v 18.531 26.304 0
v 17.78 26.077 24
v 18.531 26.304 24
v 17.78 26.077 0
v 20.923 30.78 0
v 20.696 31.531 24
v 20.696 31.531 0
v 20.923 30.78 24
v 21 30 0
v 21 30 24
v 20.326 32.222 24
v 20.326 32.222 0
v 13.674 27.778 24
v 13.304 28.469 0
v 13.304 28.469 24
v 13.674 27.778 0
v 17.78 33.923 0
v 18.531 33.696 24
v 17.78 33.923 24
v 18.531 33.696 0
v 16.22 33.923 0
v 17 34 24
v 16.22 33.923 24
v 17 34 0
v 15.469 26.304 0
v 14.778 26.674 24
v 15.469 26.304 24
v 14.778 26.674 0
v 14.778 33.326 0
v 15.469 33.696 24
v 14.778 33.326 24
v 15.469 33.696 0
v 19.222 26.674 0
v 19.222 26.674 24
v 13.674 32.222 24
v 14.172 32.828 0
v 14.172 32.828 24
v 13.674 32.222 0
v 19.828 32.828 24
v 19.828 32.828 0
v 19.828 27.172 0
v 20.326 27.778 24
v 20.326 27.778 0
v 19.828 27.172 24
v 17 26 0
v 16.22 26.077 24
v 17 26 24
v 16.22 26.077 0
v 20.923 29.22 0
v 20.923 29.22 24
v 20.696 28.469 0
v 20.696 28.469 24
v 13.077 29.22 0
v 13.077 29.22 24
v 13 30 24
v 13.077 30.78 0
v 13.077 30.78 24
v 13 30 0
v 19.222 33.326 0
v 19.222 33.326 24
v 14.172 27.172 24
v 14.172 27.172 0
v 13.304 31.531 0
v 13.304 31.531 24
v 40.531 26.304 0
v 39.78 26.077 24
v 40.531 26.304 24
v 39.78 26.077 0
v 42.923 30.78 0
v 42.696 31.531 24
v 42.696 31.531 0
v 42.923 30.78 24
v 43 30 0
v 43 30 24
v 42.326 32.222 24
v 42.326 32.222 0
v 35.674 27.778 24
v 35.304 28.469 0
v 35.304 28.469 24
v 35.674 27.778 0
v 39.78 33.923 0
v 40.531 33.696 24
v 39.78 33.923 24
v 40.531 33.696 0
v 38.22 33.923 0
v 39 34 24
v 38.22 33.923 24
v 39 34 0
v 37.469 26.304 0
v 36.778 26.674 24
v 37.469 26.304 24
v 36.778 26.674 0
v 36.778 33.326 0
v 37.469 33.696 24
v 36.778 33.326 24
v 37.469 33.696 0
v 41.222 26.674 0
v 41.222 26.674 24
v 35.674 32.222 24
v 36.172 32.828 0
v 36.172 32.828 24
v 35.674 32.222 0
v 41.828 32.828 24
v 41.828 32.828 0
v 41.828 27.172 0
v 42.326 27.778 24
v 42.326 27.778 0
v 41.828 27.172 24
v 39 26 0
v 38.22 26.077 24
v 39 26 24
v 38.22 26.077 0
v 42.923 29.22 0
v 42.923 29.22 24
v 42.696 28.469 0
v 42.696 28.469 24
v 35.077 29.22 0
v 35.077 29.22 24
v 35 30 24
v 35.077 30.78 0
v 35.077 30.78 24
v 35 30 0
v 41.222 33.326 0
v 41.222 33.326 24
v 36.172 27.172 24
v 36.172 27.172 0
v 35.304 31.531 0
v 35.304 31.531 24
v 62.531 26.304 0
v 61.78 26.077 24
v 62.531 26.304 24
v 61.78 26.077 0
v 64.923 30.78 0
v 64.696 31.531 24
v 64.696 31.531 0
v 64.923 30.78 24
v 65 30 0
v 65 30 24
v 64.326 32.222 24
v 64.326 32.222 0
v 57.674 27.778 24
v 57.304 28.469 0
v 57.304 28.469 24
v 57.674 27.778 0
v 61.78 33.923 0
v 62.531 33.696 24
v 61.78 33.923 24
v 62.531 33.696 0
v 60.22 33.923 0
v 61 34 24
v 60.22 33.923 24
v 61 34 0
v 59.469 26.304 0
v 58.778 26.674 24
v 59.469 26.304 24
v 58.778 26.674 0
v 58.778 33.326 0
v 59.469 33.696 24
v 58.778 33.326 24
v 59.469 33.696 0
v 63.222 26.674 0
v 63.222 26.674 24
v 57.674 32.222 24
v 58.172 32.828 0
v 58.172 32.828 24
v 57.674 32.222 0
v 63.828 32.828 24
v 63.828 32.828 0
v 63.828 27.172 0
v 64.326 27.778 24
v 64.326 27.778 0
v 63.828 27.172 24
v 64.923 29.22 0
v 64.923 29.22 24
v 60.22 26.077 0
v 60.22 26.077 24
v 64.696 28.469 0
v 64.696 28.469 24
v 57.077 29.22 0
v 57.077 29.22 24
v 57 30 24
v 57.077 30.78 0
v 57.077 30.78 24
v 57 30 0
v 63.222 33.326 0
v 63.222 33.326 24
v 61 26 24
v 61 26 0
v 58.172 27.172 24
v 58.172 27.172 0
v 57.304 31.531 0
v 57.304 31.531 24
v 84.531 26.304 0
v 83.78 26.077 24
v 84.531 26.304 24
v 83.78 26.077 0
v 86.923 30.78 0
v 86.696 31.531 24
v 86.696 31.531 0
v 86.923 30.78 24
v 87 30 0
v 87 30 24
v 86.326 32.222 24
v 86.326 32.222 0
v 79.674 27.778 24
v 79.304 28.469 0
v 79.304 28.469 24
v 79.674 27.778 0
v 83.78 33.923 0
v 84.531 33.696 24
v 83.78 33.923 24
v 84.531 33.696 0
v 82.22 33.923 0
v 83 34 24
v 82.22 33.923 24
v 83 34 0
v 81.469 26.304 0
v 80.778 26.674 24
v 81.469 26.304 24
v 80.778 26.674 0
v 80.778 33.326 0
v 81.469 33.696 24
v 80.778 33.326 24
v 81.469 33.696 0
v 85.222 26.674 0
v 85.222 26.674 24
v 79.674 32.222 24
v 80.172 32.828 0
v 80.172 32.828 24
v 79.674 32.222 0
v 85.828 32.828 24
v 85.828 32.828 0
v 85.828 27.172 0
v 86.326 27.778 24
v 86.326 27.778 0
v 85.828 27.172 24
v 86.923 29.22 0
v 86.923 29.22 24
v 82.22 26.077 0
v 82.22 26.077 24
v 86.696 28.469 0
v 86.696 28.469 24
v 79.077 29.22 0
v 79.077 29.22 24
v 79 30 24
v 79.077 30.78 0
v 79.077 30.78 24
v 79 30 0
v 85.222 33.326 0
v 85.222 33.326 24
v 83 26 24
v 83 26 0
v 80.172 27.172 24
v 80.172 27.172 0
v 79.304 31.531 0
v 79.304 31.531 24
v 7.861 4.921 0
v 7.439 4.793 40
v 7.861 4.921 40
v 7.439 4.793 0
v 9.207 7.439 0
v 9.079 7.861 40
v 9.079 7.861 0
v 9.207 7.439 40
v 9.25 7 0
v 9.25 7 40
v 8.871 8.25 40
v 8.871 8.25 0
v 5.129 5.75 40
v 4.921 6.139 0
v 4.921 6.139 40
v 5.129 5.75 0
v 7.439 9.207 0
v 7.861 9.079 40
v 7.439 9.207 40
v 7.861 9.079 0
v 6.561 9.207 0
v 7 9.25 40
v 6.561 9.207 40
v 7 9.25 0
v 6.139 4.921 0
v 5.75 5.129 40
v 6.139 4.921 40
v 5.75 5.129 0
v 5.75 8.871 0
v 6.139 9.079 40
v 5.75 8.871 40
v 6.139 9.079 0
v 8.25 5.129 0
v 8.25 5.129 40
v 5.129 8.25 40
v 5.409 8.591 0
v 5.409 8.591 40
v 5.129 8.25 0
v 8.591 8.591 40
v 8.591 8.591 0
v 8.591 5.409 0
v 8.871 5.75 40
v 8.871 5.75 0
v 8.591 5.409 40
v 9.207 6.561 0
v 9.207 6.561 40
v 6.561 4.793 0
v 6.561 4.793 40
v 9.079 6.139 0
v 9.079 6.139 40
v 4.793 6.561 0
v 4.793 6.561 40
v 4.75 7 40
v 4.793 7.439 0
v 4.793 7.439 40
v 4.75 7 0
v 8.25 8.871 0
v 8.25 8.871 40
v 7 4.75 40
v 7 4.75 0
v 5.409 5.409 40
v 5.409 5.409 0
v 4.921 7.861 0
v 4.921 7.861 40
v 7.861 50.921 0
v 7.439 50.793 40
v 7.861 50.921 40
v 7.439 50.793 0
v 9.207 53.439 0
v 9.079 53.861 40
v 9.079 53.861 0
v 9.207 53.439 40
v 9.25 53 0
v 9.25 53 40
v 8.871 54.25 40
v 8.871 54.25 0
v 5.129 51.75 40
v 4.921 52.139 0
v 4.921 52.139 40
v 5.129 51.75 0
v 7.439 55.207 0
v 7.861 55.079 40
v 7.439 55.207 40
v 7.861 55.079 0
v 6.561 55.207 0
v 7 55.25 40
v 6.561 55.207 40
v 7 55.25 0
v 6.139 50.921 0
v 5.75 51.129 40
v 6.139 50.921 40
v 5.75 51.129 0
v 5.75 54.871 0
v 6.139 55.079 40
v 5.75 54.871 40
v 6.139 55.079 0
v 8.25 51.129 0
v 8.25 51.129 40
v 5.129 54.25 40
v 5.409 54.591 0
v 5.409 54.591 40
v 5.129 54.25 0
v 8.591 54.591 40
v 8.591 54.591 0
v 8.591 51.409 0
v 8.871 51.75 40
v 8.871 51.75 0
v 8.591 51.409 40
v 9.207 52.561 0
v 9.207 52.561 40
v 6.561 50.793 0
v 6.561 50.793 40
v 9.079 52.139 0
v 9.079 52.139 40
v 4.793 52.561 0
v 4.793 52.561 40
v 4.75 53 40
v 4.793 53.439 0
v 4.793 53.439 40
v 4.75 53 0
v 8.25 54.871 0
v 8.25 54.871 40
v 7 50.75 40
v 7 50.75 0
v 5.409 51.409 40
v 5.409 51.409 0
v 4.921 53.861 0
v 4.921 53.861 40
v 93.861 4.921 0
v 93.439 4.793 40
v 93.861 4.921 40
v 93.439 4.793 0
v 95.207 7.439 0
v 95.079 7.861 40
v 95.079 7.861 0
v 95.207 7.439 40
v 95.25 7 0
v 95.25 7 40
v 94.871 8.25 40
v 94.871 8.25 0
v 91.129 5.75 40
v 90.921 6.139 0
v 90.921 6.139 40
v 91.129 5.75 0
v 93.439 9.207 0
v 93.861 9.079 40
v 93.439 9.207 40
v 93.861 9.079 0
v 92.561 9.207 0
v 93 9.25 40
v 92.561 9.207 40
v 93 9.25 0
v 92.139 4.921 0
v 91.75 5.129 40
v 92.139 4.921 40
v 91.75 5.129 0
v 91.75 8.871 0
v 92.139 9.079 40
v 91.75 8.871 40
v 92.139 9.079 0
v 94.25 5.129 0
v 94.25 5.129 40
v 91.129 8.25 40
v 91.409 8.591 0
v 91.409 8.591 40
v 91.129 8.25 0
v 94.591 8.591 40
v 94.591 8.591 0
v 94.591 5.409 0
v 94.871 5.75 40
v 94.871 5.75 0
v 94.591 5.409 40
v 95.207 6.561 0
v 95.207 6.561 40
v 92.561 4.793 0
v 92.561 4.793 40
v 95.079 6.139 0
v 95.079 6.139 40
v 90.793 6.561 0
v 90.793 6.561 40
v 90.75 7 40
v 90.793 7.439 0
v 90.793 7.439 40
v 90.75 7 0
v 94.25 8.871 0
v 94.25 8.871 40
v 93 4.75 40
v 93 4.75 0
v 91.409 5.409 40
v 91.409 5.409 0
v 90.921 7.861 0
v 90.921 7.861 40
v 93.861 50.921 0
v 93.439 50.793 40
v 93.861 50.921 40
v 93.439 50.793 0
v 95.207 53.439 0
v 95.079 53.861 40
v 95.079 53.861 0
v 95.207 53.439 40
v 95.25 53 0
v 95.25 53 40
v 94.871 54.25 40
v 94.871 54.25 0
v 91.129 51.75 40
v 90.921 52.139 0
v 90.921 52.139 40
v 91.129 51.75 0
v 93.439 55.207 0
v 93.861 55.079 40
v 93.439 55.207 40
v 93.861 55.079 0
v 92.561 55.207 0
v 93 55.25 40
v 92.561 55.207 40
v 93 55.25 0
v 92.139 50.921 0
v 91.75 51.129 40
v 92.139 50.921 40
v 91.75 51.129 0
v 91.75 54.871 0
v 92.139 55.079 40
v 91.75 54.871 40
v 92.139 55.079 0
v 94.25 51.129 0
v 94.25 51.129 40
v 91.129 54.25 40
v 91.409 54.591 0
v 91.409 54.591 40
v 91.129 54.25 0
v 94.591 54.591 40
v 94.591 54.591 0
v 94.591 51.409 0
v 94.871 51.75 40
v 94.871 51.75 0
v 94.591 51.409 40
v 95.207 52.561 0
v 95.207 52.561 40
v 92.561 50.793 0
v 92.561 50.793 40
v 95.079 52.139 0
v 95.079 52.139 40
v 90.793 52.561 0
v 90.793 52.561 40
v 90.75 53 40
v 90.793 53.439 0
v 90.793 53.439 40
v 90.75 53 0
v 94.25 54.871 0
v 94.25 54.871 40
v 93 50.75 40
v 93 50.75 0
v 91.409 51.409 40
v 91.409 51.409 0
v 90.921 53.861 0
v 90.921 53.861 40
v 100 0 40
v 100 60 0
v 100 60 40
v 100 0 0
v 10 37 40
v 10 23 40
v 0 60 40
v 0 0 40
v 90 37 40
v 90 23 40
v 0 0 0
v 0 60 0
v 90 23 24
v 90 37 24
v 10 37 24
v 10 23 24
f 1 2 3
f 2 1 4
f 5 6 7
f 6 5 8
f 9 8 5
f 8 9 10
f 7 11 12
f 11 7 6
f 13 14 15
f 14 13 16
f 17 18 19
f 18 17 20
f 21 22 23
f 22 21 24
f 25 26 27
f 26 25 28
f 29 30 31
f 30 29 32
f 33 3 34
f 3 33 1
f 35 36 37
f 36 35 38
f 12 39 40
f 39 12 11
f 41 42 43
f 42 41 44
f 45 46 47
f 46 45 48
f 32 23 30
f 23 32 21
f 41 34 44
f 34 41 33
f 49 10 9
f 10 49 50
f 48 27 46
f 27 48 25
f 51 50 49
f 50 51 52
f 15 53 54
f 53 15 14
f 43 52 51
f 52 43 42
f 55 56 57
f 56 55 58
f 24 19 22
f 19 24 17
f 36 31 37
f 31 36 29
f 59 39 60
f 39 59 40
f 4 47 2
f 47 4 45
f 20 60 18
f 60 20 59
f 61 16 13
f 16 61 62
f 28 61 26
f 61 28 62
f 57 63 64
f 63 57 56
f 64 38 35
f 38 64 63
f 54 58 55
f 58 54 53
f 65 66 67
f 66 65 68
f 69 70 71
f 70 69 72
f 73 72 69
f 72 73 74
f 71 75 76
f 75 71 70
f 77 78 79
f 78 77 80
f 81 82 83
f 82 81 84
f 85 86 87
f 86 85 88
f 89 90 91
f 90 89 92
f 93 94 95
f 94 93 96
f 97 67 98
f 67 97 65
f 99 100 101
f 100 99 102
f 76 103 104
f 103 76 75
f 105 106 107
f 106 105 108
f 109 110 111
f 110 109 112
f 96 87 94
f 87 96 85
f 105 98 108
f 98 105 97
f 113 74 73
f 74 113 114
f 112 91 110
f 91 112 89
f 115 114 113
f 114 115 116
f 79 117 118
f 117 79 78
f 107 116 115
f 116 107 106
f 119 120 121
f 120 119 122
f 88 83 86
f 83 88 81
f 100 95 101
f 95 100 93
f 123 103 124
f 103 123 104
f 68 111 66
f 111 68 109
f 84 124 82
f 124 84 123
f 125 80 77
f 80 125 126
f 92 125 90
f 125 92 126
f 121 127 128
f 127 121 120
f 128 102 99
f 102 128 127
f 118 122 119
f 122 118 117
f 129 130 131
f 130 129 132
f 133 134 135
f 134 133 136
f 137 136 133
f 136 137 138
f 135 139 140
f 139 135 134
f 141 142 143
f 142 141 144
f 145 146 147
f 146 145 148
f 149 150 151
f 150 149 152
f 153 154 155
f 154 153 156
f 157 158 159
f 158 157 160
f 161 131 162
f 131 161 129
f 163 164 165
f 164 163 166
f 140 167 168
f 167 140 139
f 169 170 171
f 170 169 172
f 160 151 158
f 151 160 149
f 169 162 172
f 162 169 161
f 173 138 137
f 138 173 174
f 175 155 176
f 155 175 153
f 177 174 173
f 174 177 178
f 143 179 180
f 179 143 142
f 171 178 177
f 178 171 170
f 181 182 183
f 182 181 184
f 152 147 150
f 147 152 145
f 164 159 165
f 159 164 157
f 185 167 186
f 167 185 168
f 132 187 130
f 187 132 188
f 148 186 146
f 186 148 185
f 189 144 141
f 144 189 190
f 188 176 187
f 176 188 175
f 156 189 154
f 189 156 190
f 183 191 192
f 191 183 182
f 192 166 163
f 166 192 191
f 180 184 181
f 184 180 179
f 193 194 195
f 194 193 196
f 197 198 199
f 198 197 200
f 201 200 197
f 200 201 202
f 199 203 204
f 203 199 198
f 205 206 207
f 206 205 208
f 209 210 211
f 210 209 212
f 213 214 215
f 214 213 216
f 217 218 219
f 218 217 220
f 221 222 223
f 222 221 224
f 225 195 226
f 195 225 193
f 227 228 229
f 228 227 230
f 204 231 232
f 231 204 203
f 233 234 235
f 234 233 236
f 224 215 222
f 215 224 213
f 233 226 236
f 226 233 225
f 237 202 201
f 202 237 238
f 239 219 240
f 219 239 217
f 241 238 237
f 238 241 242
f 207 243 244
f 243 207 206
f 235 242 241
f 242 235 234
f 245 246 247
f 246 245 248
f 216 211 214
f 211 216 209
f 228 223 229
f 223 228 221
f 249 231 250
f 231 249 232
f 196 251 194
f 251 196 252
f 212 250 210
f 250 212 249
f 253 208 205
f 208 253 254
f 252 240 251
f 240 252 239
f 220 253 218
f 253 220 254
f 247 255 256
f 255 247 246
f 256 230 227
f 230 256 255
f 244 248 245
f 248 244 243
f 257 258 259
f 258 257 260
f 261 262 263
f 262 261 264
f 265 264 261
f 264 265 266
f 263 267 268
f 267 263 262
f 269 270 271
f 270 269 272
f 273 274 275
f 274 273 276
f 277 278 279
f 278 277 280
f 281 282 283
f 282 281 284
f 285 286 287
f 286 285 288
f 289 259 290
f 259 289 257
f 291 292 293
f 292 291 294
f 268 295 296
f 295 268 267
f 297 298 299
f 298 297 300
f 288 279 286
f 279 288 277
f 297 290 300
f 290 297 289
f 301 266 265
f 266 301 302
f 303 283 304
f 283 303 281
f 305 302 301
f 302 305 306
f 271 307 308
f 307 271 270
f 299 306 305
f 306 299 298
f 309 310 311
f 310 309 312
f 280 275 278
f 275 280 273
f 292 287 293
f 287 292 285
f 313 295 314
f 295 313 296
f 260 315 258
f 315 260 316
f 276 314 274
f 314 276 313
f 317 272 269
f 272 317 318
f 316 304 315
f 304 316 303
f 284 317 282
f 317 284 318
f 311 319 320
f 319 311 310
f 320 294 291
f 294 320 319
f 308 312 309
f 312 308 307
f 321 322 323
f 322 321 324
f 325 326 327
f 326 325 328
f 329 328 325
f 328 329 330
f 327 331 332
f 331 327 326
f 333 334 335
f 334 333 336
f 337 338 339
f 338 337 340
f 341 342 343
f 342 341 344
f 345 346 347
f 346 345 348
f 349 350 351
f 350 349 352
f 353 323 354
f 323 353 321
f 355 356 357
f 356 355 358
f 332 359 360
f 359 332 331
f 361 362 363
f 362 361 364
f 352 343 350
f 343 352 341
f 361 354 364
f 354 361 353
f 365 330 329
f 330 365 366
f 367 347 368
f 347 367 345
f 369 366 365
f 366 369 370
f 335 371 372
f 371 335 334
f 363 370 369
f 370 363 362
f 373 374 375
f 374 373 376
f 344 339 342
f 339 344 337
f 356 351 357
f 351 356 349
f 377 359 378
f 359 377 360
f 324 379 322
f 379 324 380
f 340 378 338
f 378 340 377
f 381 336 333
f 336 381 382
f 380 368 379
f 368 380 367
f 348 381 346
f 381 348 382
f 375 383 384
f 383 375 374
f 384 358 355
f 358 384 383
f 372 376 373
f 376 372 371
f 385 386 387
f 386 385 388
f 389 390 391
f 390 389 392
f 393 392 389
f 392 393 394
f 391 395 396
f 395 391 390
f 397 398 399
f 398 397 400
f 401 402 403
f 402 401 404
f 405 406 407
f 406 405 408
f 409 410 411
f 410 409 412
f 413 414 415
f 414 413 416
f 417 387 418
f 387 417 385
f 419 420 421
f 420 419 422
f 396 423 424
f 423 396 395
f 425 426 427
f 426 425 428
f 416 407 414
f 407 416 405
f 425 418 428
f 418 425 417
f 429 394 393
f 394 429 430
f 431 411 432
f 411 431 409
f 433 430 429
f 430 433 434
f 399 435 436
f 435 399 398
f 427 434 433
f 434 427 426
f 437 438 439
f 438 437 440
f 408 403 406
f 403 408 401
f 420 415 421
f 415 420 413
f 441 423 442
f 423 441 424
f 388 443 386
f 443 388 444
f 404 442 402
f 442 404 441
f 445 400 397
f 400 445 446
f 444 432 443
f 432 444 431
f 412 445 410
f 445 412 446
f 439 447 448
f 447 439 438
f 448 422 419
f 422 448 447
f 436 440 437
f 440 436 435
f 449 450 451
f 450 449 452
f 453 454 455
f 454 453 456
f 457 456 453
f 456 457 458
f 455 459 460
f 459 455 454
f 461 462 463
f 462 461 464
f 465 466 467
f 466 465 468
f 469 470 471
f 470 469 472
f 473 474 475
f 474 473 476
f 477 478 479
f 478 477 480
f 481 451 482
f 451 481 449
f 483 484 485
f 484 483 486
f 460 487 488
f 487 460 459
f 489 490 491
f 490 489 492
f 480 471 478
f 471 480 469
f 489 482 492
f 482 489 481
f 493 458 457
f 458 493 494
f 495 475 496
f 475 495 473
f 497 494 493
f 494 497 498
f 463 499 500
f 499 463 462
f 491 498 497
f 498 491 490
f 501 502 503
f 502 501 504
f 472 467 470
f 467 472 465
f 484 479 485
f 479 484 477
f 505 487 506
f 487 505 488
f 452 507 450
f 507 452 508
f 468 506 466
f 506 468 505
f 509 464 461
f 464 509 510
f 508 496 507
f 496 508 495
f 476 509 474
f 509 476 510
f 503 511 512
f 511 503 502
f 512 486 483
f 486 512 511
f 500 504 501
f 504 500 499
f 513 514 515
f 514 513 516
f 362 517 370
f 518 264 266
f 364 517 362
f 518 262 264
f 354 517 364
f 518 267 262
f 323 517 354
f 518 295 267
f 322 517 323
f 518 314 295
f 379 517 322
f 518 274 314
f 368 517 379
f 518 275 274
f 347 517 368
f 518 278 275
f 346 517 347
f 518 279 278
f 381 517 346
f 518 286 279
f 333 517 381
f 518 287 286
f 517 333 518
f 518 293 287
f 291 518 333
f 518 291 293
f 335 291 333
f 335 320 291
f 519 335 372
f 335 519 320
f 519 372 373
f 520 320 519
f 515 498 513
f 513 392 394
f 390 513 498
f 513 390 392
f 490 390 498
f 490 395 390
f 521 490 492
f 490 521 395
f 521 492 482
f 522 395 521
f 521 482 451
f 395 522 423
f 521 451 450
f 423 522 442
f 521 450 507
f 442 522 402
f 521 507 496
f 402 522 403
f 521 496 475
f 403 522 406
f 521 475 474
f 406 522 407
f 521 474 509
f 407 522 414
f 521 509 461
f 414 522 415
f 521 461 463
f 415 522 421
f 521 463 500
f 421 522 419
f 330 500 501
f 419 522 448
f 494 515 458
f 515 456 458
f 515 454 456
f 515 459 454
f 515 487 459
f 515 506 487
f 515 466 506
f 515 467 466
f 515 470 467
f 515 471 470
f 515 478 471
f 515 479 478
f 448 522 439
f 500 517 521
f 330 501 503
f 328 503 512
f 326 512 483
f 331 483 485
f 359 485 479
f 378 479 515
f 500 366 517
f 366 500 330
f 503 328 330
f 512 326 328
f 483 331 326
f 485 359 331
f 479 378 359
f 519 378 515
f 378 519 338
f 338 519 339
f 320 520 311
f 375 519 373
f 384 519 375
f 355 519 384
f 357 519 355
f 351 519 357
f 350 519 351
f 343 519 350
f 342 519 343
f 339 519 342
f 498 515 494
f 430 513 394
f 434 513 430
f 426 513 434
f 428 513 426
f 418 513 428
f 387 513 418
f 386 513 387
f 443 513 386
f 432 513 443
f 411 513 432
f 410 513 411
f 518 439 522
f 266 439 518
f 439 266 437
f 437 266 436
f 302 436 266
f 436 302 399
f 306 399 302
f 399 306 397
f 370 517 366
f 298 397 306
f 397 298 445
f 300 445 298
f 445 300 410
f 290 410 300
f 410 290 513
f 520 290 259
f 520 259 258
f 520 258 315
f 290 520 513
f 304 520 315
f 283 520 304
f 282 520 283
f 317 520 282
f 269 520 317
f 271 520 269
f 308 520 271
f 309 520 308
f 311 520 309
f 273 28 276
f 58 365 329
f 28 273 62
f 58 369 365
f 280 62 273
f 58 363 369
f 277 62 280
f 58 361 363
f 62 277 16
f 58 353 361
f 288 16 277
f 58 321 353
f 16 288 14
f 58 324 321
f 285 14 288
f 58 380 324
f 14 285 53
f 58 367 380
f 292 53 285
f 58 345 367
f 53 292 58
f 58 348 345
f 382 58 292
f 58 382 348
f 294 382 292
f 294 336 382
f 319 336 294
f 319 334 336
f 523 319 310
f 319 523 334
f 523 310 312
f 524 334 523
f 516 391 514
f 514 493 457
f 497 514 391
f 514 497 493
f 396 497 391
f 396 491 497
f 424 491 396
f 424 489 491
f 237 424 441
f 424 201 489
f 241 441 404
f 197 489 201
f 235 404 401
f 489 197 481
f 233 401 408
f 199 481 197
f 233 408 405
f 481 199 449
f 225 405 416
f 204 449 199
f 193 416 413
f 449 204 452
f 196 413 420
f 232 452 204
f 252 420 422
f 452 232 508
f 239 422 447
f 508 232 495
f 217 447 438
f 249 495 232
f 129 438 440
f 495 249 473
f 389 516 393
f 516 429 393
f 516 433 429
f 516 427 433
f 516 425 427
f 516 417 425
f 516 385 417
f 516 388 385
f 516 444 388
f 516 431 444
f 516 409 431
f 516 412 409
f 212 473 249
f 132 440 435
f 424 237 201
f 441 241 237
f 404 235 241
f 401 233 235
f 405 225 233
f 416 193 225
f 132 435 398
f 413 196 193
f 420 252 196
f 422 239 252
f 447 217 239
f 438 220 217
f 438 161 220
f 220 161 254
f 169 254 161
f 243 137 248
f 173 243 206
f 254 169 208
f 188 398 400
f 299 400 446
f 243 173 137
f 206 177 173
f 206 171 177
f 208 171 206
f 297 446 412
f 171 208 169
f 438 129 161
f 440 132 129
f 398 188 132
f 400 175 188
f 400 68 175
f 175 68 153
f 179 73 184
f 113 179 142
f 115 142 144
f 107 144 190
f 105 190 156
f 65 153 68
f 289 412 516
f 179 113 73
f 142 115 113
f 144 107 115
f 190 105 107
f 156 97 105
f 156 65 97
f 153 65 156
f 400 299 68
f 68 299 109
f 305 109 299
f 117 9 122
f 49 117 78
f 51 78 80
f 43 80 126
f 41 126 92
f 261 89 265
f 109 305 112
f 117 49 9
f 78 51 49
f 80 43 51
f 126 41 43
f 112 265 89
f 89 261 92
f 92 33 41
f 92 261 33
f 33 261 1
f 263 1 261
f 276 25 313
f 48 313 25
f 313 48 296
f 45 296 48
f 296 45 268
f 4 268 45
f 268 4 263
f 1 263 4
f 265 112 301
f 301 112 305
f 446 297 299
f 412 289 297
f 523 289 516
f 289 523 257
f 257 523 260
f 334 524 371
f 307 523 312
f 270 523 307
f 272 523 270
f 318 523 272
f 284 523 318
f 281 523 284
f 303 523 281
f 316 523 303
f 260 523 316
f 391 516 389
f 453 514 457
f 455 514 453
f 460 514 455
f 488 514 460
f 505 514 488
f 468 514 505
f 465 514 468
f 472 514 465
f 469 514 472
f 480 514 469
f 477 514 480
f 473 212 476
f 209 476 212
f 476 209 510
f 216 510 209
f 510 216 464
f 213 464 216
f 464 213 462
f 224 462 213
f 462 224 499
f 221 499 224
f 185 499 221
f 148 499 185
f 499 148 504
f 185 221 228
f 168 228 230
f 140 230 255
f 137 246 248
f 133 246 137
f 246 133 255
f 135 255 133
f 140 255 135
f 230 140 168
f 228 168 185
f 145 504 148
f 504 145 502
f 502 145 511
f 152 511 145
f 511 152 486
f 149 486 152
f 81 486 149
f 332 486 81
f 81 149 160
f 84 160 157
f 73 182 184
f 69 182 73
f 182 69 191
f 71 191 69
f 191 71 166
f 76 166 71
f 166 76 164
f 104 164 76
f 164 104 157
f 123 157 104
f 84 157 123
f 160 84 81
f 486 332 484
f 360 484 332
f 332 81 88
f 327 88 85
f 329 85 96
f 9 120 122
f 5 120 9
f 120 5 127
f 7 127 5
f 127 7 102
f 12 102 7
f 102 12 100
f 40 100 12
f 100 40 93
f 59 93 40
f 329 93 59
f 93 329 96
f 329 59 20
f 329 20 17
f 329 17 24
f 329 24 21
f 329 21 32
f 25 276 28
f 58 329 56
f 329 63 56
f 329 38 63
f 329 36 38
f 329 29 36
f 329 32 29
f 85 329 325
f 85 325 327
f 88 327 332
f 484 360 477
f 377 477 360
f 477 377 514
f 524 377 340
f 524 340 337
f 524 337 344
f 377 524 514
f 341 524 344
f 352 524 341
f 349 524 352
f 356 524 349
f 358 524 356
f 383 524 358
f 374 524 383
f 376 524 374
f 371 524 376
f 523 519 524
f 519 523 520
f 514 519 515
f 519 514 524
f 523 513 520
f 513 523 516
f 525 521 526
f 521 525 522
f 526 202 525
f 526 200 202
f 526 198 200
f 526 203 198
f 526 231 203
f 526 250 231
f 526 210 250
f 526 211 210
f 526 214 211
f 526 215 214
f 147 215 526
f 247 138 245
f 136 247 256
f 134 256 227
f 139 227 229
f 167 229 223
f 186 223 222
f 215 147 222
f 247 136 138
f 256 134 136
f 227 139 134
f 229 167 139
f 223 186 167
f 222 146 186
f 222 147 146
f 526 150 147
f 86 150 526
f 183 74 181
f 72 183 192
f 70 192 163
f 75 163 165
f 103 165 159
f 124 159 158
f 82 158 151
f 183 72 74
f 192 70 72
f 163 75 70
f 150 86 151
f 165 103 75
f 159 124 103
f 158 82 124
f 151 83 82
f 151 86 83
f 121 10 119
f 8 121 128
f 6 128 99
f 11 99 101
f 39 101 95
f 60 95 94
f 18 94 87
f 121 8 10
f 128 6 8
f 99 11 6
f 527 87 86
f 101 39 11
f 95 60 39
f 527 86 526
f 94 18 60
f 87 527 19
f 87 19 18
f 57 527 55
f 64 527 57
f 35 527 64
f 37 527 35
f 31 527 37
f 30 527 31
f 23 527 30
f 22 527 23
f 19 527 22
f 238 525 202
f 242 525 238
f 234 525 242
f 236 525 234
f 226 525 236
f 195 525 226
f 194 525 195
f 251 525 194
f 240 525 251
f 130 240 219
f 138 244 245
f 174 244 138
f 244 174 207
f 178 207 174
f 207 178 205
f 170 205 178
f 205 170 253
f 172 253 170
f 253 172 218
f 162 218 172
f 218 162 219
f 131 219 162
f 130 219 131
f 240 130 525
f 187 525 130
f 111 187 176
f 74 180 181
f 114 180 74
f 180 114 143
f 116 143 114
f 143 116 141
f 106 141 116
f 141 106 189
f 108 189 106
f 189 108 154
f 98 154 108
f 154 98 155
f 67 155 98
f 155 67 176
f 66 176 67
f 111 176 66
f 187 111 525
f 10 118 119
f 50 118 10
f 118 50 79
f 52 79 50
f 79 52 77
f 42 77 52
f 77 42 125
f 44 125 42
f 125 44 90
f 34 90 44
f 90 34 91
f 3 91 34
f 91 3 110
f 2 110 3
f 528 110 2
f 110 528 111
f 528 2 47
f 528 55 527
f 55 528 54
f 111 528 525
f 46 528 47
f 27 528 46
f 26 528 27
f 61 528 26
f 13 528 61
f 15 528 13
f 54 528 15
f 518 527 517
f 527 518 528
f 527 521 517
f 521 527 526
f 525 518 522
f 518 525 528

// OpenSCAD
$fn = 32;

// ----------------------------------------------------------------------
// Manifold block: gallery_top manifold
// ----------------------------------------------------------------------

// --- parameters (mm) ---
block_l = 100;            // block length, X
block_w = 60;             // block width, Y
block_h = 40;             // block height, Z
port_d = 8;               // port bore diameter
port_pitch = 22;          // port pitch along X
gallery_d = 14;           // top gallery width, Y
gallery_depth = 16;       // gallery pocket depth
wall_p = 10;              // gallery end wall thickness, X
mnt_d = 4.5;              // mounting hole diameter
mnt_in = 7;               // mounting hole inset from the edges

n_ports = 4;  // ports in the row
port_x0 = (block_l - (n_ports - 1) * port_pitch) / 2;  // first port X

difference() {
  cube([block_l, block_w, block_h]);
  for (i = [0 : n_ports - 1])
    translate([port_x0 + i * port_pitch, block_w / 2, -1])
      cylinder(h = block_h + 2, d = port_d);
  translate([wall_p, block_w / 2 - gallery_d / 2, block_h - gallery_depth])
    cube([block_l - 2 * wall_p, gallery_d, gallery_depth + 1]);
  for (cx = [mnt_in, block_l - mnt_in])
    for (cy = [mnt_in, block_w - mnt_in])
      translate([cx, cy, -1]) cylinder(h = block_h + 2, d = mnt_d);
}
